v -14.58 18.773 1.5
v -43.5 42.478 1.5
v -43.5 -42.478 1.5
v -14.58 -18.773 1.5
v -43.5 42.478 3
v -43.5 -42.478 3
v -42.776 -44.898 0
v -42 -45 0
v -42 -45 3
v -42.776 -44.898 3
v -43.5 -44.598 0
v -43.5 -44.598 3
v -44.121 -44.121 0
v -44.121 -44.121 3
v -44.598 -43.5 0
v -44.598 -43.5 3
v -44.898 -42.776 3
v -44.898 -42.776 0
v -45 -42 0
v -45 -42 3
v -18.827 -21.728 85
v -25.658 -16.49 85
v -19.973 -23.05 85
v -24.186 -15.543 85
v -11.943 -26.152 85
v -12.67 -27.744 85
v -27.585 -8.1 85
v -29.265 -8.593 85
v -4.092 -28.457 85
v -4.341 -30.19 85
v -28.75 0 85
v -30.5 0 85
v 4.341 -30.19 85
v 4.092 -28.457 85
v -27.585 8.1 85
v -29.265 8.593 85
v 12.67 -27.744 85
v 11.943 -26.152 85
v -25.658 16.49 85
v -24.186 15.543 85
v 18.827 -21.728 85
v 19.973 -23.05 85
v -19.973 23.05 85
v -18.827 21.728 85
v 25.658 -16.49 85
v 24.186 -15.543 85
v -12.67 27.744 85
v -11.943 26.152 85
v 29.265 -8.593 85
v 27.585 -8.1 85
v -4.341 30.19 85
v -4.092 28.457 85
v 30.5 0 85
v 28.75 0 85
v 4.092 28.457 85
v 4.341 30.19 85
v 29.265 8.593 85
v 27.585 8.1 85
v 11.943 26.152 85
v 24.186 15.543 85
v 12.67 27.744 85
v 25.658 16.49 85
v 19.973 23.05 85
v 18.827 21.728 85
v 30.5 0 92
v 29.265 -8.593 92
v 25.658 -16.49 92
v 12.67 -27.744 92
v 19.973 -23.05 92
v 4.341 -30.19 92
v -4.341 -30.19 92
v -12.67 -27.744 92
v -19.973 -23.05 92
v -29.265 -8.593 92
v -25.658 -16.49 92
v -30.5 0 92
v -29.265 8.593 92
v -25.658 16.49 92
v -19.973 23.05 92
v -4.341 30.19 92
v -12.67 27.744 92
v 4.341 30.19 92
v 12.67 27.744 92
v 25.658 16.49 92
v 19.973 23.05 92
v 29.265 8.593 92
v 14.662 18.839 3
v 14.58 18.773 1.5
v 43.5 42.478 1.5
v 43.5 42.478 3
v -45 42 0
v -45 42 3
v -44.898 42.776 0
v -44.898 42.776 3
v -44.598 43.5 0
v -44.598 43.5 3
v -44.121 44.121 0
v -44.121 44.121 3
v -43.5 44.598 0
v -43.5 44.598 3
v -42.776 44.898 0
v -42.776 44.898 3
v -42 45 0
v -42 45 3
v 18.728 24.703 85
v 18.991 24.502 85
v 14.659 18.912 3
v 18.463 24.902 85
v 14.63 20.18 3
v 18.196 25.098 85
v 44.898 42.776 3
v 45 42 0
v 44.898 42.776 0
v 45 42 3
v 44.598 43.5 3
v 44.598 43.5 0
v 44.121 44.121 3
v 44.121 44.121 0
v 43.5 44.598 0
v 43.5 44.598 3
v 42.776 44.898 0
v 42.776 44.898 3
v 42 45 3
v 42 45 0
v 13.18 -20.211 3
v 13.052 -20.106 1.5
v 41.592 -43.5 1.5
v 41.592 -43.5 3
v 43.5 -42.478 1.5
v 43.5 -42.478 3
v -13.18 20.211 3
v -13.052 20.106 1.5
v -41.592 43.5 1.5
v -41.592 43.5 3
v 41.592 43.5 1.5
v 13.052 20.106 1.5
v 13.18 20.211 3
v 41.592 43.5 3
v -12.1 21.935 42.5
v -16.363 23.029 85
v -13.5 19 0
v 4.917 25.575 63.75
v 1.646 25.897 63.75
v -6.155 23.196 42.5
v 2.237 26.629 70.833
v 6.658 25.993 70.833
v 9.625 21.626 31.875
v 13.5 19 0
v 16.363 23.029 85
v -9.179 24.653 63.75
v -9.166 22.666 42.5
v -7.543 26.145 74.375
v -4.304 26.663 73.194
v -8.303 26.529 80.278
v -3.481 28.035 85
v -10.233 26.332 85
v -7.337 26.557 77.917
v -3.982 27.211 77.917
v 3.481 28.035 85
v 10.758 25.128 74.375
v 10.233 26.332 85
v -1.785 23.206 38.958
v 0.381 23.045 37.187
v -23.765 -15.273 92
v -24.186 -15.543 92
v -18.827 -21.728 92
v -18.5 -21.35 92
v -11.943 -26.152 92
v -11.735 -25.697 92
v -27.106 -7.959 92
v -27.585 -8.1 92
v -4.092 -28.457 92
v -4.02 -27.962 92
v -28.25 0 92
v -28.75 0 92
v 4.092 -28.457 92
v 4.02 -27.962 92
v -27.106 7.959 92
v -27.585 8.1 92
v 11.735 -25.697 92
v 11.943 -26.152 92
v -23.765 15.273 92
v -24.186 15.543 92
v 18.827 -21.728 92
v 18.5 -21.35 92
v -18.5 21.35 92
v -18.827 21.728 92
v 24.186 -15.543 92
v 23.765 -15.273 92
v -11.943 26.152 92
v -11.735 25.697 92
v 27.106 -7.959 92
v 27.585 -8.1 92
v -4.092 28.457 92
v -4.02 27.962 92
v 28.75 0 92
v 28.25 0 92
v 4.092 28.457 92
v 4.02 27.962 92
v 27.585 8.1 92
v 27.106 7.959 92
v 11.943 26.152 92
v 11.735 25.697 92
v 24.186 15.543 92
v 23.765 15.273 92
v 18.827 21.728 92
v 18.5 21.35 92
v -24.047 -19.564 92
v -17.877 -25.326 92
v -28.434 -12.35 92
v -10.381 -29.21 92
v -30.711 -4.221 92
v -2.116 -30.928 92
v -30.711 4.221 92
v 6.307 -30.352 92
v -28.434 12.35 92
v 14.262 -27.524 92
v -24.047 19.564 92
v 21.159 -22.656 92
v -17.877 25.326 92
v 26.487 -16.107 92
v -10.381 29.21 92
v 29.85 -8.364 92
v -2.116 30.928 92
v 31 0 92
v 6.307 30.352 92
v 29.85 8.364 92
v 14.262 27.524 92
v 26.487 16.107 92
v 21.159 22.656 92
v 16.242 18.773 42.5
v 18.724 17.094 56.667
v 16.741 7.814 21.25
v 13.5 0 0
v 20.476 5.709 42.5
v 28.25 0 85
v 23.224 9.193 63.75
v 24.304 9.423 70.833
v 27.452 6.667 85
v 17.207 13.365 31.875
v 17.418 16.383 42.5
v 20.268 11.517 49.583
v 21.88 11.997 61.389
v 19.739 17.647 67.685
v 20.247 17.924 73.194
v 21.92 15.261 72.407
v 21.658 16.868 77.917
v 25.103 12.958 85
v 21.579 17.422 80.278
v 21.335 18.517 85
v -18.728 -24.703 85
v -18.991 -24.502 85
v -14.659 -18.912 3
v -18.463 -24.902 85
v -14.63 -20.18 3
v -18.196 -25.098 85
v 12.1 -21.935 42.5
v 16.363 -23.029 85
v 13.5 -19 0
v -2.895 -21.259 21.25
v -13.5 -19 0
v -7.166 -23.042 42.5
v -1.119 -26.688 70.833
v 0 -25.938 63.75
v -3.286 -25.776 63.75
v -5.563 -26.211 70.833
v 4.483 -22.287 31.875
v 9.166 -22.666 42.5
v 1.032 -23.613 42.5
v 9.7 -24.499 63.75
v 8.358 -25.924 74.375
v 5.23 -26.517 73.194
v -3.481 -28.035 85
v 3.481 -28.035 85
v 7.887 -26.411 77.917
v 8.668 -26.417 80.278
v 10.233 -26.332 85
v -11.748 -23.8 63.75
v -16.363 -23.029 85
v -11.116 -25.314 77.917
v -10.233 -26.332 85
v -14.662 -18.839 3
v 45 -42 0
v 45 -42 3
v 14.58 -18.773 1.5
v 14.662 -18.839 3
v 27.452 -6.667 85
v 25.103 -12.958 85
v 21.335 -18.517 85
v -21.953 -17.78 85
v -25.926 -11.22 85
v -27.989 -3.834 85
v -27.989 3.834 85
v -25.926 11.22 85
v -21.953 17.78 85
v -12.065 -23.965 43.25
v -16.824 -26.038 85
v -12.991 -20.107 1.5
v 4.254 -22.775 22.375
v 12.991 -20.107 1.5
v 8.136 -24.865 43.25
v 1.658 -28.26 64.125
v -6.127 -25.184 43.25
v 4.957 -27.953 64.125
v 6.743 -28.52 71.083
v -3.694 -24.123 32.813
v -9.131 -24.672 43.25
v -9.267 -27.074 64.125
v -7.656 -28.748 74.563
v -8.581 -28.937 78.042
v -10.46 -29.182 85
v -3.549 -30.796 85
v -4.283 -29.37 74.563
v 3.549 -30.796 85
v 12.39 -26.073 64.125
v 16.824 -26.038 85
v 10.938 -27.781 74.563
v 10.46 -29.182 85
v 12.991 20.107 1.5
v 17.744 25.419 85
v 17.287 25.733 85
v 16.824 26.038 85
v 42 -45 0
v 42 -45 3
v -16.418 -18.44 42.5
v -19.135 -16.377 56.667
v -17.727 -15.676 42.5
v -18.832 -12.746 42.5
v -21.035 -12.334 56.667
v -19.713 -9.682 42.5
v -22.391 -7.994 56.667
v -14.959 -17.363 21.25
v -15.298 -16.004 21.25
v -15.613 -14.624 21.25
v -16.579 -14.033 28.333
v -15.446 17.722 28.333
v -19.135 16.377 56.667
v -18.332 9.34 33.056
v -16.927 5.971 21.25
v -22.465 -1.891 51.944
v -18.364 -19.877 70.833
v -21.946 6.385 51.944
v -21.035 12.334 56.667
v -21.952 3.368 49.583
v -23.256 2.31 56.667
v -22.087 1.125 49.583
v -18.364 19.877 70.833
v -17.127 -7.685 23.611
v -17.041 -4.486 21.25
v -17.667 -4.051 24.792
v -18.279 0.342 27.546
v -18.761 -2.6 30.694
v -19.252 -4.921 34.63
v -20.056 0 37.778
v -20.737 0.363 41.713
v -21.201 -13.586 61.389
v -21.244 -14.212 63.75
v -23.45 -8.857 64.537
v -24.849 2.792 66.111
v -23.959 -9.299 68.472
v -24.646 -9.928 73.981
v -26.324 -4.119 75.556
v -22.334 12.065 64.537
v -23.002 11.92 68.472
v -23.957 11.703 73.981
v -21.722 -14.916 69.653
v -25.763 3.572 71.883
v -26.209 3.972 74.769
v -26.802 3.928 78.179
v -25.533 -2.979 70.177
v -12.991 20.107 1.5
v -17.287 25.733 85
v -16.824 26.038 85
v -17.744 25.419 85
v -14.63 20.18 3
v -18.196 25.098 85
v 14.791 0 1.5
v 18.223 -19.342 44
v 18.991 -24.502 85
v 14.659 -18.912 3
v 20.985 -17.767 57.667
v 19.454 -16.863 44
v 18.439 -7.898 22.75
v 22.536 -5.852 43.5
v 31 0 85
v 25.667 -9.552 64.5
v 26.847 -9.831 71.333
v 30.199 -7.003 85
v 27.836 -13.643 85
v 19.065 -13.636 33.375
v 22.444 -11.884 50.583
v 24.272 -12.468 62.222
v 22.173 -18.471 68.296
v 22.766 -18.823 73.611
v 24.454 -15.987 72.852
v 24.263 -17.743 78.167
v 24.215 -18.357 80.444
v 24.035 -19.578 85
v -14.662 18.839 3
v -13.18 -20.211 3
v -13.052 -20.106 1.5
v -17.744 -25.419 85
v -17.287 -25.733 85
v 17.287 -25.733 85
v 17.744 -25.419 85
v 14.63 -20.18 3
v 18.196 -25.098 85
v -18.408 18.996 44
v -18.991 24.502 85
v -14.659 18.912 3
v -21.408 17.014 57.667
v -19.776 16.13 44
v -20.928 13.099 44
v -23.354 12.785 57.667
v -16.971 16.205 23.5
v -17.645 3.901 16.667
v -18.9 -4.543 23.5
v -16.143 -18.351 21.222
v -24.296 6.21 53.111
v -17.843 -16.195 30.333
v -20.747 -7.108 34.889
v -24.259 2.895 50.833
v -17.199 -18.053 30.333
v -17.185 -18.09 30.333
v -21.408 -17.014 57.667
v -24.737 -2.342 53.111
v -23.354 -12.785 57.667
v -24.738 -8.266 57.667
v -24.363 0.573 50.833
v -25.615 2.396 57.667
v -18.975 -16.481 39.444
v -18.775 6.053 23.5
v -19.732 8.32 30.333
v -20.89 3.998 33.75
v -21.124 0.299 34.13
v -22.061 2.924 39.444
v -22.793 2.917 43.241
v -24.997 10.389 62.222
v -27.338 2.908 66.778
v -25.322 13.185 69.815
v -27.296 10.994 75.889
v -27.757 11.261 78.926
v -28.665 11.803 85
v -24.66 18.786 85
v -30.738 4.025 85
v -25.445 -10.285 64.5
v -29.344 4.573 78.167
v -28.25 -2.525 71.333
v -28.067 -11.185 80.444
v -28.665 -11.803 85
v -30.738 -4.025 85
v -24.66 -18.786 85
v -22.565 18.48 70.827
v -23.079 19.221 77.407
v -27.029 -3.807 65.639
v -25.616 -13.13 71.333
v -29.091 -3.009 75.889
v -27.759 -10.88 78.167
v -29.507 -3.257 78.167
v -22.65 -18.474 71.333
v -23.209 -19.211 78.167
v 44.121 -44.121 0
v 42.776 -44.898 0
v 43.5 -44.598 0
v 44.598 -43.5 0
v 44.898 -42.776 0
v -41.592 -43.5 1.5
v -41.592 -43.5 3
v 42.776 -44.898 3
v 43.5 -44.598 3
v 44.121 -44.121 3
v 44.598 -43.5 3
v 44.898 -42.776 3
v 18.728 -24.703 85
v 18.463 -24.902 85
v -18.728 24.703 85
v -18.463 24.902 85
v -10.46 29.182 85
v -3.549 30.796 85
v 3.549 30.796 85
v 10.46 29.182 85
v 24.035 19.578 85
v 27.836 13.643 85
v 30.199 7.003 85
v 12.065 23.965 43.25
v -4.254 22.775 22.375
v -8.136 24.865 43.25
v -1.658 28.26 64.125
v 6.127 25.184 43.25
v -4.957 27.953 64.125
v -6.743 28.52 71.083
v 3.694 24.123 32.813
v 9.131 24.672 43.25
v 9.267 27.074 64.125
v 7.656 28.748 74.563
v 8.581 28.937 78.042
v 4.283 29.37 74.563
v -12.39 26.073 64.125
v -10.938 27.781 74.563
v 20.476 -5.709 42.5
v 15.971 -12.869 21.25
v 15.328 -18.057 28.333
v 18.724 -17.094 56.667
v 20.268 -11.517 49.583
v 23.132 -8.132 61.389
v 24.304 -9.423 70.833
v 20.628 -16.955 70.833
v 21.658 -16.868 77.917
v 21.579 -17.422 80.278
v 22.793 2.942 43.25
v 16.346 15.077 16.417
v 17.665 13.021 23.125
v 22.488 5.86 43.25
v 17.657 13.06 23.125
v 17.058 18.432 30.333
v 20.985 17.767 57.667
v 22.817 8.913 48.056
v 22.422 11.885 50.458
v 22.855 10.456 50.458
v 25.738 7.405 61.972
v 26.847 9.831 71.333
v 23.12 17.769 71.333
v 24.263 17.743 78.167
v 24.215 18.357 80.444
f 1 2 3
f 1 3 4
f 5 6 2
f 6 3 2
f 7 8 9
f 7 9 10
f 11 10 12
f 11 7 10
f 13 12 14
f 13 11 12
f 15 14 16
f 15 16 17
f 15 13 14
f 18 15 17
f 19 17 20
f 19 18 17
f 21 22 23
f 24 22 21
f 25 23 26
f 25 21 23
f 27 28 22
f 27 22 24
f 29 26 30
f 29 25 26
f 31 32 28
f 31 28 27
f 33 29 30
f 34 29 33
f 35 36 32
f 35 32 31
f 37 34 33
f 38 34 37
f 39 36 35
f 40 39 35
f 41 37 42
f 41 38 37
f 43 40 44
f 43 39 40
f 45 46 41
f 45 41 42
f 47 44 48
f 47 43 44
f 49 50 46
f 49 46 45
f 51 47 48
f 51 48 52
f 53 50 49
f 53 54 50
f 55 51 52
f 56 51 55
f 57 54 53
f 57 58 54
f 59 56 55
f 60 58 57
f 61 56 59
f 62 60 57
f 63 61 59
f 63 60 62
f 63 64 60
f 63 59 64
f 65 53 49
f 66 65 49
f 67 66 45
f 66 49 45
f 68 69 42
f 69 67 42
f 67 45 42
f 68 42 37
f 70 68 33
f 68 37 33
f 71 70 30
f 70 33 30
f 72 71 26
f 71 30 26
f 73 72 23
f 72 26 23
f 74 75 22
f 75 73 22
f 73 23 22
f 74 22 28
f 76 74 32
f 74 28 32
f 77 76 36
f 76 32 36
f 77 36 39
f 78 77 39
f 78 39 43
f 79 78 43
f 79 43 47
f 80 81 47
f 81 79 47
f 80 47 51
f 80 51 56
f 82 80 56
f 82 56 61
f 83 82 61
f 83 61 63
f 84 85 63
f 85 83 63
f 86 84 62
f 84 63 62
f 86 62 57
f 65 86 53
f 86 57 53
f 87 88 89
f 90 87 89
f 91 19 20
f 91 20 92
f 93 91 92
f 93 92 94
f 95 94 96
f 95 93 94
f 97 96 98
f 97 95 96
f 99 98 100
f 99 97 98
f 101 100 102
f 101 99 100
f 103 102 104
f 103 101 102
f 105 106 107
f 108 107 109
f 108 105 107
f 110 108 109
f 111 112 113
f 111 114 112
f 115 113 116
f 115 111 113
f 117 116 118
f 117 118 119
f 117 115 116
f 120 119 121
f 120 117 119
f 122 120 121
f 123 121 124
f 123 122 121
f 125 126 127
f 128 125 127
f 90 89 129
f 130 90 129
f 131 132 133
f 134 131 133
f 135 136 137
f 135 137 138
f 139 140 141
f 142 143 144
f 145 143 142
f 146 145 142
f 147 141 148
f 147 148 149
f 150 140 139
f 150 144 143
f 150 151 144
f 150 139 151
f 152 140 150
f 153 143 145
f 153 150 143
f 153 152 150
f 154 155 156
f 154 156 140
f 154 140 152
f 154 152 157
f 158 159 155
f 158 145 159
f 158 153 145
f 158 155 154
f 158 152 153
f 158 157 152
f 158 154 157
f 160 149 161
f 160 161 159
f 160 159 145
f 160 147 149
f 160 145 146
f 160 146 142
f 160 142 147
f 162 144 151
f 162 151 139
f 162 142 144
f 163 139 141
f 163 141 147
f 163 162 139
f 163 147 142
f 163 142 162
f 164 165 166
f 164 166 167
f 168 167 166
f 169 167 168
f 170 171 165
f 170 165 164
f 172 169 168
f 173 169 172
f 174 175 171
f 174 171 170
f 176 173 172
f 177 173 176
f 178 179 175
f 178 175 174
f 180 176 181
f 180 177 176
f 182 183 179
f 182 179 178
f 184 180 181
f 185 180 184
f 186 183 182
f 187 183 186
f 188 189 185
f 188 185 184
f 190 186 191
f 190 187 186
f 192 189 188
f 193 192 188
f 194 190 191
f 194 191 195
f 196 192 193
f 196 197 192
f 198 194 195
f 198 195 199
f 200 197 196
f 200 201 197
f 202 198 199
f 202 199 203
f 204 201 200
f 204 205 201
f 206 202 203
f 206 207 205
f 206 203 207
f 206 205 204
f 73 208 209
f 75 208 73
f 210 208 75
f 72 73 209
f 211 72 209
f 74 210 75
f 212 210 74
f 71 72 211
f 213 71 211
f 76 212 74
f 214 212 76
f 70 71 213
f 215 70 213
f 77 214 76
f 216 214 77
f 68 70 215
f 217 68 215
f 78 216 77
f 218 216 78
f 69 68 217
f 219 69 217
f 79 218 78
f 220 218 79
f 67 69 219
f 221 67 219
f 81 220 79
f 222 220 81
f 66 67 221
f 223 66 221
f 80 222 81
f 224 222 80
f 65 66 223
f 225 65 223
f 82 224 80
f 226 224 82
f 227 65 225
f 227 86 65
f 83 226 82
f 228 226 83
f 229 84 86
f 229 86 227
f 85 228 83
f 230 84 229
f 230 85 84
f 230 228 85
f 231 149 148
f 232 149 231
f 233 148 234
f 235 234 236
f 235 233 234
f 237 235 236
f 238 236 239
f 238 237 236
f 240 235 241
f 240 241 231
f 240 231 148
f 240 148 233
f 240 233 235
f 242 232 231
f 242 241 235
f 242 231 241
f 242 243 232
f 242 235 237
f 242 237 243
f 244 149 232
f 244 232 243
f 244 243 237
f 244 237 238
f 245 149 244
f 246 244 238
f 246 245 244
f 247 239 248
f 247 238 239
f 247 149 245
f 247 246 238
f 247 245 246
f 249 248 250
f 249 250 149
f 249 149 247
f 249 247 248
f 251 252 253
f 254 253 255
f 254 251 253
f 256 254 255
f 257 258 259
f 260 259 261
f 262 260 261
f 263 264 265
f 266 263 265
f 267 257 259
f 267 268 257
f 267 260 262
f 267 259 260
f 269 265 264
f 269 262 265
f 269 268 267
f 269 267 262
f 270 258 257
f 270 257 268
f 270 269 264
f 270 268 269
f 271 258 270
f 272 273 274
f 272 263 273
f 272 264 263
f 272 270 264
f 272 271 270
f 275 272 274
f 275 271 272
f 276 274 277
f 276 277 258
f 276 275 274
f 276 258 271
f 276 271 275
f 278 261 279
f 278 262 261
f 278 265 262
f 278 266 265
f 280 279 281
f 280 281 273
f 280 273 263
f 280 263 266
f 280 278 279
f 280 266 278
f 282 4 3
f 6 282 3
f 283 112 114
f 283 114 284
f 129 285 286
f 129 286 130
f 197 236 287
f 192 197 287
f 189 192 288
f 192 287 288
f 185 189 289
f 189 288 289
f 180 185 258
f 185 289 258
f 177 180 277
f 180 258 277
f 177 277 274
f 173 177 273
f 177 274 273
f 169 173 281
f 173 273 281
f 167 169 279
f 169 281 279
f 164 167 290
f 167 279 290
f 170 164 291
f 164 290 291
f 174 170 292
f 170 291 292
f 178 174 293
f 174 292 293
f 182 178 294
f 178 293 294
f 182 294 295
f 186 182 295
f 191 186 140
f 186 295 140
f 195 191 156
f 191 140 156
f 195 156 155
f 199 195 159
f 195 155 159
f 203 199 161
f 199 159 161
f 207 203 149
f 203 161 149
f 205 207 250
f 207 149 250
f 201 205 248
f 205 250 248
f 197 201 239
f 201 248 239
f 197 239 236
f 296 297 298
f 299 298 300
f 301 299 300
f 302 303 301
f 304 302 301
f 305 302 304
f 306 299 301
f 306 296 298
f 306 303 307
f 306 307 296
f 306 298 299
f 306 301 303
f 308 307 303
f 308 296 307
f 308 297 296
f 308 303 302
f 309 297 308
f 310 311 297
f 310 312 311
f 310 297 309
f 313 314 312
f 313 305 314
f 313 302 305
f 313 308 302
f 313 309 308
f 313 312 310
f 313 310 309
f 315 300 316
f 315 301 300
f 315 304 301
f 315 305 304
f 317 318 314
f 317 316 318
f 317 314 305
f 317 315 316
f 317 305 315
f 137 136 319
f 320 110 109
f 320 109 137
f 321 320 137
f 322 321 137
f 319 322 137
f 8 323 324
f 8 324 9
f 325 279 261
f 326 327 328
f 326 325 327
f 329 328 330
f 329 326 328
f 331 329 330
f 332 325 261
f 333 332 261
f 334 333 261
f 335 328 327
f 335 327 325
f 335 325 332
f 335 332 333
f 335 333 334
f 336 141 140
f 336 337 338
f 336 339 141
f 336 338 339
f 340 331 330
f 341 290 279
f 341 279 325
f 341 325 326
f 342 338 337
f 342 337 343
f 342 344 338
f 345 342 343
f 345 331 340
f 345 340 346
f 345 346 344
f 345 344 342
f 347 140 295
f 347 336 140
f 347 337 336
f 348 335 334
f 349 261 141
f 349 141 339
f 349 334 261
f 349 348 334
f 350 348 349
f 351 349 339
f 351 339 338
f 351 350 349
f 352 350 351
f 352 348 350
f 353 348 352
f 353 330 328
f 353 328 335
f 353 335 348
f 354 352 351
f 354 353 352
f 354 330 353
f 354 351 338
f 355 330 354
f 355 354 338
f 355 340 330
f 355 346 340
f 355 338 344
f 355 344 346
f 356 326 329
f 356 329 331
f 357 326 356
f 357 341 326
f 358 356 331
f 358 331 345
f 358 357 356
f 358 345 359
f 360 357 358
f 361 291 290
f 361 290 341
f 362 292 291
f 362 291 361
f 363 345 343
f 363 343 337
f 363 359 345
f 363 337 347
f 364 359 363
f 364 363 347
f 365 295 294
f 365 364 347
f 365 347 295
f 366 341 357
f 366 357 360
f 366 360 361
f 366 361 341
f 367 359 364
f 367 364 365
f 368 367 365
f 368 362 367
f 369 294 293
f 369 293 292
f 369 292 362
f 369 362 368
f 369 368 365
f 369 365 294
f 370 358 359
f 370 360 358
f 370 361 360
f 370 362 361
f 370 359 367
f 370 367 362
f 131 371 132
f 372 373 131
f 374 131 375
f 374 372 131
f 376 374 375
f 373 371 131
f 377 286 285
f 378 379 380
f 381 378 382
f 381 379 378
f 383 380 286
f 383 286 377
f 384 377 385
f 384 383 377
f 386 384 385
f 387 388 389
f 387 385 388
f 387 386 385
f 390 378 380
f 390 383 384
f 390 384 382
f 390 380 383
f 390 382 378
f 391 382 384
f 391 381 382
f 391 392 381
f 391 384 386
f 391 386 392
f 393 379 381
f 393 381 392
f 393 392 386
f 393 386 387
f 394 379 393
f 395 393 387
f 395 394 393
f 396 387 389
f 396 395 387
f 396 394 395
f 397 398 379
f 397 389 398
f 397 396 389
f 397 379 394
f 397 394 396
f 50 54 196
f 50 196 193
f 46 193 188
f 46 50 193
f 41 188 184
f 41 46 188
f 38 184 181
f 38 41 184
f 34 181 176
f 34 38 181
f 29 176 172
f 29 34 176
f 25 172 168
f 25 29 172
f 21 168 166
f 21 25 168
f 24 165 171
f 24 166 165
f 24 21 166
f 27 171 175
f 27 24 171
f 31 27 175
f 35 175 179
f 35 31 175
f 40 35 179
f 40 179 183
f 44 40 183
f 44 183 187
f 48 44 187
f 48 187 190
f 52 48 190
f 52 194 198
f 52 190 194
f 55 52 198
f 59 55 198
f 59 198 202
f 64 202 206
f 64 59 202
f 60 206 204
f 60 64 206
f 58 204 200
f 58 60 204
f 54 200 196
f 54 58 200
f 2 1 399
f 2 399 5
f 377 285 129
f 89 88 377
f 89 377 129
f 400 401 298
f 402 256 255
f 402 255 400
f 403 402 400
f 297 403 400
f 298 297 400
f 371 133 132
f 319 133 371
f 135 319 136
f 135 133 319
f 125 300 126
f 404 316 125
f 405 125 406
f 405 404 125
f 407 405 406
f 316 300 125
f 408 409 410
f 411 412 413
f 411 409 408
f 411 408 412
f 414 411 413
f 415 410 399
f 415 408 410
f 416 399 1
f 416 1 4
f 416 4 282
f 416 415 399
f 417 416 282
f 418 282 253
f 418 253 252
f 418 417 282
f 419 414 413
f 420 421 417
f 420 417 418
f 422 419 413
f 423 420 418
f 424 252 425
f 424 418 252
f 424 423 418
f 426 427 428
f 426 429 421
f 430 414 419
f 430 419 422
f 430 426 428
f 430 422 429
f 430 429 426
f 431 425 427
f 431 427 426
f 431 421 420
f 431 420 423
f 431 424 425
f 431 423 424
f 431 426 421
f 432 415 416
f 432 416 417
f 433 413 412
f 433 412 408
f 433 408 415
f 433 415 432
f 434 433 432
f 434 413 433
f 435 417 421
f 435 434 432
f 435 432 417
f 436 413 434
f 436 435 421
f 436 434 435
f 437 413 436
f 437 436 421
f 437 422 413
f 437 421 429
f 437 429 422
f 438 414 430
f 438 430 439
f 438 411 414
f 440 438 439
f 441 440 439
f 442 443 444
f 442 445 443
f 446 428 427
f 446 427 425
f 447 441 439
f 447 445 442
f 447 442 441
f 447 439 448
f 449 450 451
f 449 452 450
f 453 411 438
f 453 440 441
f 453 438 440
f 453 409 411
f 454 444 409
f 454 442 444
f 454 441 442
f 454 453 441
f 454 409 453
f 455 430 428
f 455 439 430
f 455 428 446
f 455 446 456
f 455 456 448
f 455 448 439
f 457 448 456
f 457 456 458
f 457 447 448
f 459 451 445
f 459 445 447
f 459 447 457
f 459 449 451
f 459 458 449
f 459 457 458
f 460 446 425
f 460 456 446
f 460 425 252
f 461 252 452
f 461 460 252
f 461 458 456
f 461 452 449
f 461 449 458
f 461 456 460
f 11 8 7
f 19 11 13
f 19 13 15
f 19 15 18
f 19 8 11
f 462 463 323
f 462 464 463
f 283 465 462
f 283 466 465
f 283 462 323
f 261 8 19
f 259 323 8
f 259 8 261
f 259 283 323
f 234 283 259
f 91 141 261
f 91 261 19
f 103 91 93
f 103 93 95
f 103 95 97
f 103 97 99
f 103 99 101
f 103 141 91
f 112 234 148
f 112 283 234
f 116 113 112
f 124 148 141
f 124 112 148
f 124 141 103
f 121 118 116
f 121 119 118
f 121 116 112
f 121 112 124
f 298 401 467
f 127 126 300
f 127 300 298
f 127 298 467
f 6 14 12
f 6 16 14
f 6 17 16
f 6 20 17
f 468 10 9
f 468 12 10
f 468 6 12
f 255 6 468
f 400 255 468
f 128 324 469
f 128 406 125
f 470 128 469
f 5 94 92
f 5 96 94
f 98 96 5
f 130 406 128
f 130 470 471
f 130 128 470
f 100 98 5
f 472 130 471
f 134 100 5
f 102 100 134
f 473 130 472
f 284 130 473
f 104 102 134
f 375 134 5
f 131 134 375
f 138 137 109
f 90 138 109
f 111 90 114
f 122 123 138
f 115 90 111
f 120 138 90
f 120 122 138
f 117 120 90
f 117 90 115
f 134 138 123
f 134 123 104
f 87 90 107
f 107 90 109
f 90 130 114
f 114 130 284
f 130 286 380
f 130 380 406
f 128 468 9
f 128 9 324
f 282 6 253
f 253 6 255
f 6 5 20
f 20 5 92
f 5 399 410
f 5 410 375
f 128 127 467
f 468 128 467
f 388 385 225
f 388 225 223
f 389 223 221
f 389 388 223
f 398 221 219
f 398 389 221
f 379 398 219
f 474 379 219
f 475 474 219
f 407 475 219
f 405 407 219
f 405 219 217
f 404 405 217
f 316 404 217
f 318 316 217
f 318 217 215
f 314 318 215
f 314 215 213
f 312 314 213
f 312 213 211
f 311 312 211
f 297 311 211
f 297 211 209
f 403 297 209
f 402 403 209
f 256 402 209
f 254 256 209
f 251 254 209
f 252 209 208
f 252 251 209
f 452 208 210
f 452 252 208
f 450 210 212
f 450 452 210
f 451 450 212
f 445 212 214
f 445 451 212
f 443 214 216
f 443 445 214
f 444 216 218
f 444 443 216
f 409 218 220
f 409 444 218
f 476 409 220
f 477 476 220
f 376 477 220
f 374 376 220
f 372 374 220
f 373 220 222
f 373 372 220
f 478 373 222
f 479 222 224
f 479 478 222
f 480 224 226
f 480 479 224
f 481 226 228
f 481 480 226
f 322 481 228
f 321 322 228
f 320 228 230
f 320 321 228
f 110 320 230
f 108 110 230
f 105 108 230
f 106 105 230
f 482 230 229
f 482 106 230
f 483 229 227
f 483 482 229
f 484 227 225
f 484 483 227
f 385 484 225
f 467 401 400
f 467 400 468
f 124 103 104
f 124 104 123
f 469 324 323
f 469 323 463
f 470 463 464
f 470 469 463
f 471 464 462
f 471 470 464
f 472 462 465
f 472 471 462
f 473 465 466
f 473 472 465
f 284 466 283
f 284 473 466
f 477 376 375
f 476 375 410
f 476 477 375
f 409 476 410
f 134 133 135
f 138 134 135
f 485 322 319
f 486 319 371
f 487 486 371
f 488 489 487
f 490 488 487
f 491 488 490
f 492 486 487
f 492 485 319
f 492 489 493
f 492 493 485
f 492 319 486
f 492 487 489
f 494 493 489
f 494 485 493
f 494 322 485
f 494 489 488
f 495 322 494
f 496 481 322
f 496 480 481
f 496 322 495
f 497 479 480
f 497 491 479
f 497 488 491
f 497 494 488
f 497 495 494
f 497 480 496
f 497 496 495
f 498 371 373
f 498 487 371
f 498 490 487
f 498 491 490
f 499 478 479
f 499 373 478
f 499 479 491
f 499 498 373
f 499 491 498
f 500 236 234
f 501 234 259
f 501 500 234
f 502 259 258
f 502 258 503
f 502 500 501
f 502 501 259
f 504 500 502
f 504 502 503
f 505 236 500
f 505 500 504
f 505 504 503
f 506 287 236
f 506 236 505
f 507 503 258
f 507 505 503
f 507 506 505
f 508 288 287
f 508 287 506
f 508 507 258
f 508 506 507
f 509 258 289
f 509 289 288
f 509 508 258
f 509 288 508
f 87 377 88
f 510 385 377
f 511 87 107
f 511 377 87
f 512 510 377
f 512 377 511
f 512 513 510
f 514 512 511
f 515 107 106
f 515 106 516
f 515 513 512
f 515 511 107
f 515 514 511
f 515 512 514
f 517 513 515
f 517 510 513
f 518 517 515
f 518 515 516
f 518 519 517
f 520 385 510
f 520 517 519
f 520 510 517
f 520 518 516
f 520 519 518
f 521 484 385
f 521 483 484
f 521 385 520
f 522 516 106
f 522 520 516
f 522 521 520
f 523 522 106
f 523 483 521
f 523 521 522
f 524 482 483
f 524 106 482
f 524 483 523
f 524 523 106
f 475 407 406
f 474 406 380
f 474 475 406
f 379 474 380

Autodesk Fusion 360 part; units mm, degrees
sketch "Sketch1" plane through (0, 0, 0) normal (0, 0, 1) x (1, 0, 0)
  line L0 (-13.5, 19) -> (13.5, 19)
  line L1 (13.5, 19) -> (13.5, -19)
  line L2 (13.5, -19) -> (-13.5, -19)
  line L3 (-13.5, -19) -> (-13.5, 19)
  line L4 (-13.5, 19) -> (13.5, -19) construction
  line L5 (14.5, -20) -> (-14.5, -20)
  line L6 (-14.5, -20) -> (-14.5, 20)
  line L7 (-14.5, 20) -> (14.5, 20)
  line L8 (14.5, 20) -> (14.5, -20)
  line L9 (-45, 45) -> (45, 45)
  line L10 (45, 45) -> (45, -45)
  line L11 (45, -45) -> (-45, -45)
  line L12 (-45, -45) -> (-45, 45)
  line L13 (-45, 45) -> (45, -45) construction
  line L14 (-14.5, -20) -> (-45, -45)
  line L15 (-14.5, 20) -> (-45, 45)
  line L16 (14.5, 20) -> (45, 45)
  line L17 (14.5, -20) -> (45, -45)
  line L18 (-43.5, 43.5) -> (43.5, 43.5)
  line L19 (43.5, 43.5) -> (43.5, -43.5)
  line L20 (43.5, -43.5) -> (-43.5, -43.5)
  line L21 (-43.5, -43.5) -> (-43.5, 43.5)
  line L22 (-12.9225, 20) -> (-41.5925, 43.5)
  line L23 (-14.5, 18.707) -> (-43.5, 42.4775)
  line L24 (14.5, 18.707) -> (43.5, 42.4775)
  line L25 (12.9225, 20) -> (41.5925, 43.5)
  line L26 (12.9225, -20) -> (41.5925, -43.5)
  line L27 (14.5, -18.707) -> (43.5, -42.4775)
  line L28 (-14.5, -18.707) -> (-43.5, -42.4775)
  line L29 (-12.9225, -20) -> (-41.5925, -43.5)
  dimension "d5" = 27
  dimension "d6" = 38
  dimension "d15" = 90
  dimension "d16" = 90
  dimension "d44" = 1.5
ref_plane "WorkPlane1" through (0, 0, 85) normal (0, 0, 1) x (1, 0, 0)
sketch "Sketch2" plane through (0, 0, 85) normal (0, 0, 1) x (1, 0, 0)
  circle A0 centre (0, 0) radius 28.75
  circle A1 centre (0, 0) radius 30.5
  circle A2 centre (0, 0) radius 28.25
  circle A3 centre (0, 0) radius 31
  dimension "d10" = 57.5
  dimension "d11" = 61
  dimension "d13" = -0.5
  dimension "d14" = 0.5
loft "Loft3" add profiles "Sketch1", "Sketch2" section 1 contours L5 L6 L7 L8 section 2 contours A0 | A1 | A3 makes body 1
loft "Loft4" cut profiles "Sketch2", "Sketch1" section 1 contours A2 section 2 contours L0 L1 L2 L3 bodies 1
extrude "Extrude3" add sketch "Sketch1" along normal blind 1.5 separate body contours L5 L17 L20 L26 | L8 L17 L19 L20 L27 | L5 L20 L26 L29 | L8 L19 L24 L27 | L10 L16 L17 L18 L19 L20 | L11 L14 L17 L20 | L5 L14 L20 L29 | L8 L16 L18 L19 L24 | L6 L14 L20 L21 L28 | L7 L16 L18 L25 | L9 L15 L16 L18 | L12 L14 L15 L18 L20 L21 | L6 L21 L23 L28 | L7 L18 L22 L25 | L6 L15 L18 L21 L23 | L7 L15 L18 L22 makes body 2
extrude "Extrude4" add sketch "Sketch2" along normal blind 7 bodies 1
extrude "Extrude7" add sketch "Sketch1" along normal blind 3 contours L5 L17 L20 L26 | L8 L17 L19 L20 L27 | L10 L16 L17 L18 L19 L20 | L11 L14 L17 L20 | L5 L14 L20 L29 | L8 L16 L18 L19 L24 | L6 L14 L20 L21 L28 | L7 L16 L18 L25 | L9 L15 L16 L18 | L12 L14 L15 L18 L20 L21 | L6 L15 L18 L21 L23 | L7 L15 L18 L22 bodies 1 2
fillet "Fillet1" radius 3 4 edges at (45, -45, 1.5) (-45, -45, 1.5) (-45, 45, 1.5) (45, 45, 1.5) on bodies 1
equation "aparture_x = 27 mm"
equation "aparture_y = 38 mm"
equation "tube_height = 85 mm"
equation "wall_thickness = 1 mm"
equation "d5 = aparture_x"
equation "d6 = aparture_y"
equation "d7 = tube_height"
equation "hood_inner_dia = 57.5 mm"
equation "hood_outer_dia = 61 mm"
equation "d10 = hood_inner_dia"
equation "d11 = hood_outer_dia"
equation "d13 = -wall_thickness / 2"
equation "d14 = wall_thickness / 2"
equation "d15 = raft_y"
equation "d16 = raft_x"
equation "base_height = 1.5 mm"
equation "d22 = base_height"
equation "hood_lip_height = 7 mm"
equation "d25 = hood_lip_height"
equation "raft_x = 90 mm"
equation "raft_y = raft_x"
equation "rib_width = 1.5 mm"
equation "d44 = rib_width"
equation "rib_height = 1.5 mm"
equation "d54 = base_height + rib_height"
equation "round_corner_radius = 3 mm"
equation "d58 = round_corner_radius"
equation "tube_base_fillet_radius = 2 mm"
equation "d61 = tube_base_fillet_radius"
